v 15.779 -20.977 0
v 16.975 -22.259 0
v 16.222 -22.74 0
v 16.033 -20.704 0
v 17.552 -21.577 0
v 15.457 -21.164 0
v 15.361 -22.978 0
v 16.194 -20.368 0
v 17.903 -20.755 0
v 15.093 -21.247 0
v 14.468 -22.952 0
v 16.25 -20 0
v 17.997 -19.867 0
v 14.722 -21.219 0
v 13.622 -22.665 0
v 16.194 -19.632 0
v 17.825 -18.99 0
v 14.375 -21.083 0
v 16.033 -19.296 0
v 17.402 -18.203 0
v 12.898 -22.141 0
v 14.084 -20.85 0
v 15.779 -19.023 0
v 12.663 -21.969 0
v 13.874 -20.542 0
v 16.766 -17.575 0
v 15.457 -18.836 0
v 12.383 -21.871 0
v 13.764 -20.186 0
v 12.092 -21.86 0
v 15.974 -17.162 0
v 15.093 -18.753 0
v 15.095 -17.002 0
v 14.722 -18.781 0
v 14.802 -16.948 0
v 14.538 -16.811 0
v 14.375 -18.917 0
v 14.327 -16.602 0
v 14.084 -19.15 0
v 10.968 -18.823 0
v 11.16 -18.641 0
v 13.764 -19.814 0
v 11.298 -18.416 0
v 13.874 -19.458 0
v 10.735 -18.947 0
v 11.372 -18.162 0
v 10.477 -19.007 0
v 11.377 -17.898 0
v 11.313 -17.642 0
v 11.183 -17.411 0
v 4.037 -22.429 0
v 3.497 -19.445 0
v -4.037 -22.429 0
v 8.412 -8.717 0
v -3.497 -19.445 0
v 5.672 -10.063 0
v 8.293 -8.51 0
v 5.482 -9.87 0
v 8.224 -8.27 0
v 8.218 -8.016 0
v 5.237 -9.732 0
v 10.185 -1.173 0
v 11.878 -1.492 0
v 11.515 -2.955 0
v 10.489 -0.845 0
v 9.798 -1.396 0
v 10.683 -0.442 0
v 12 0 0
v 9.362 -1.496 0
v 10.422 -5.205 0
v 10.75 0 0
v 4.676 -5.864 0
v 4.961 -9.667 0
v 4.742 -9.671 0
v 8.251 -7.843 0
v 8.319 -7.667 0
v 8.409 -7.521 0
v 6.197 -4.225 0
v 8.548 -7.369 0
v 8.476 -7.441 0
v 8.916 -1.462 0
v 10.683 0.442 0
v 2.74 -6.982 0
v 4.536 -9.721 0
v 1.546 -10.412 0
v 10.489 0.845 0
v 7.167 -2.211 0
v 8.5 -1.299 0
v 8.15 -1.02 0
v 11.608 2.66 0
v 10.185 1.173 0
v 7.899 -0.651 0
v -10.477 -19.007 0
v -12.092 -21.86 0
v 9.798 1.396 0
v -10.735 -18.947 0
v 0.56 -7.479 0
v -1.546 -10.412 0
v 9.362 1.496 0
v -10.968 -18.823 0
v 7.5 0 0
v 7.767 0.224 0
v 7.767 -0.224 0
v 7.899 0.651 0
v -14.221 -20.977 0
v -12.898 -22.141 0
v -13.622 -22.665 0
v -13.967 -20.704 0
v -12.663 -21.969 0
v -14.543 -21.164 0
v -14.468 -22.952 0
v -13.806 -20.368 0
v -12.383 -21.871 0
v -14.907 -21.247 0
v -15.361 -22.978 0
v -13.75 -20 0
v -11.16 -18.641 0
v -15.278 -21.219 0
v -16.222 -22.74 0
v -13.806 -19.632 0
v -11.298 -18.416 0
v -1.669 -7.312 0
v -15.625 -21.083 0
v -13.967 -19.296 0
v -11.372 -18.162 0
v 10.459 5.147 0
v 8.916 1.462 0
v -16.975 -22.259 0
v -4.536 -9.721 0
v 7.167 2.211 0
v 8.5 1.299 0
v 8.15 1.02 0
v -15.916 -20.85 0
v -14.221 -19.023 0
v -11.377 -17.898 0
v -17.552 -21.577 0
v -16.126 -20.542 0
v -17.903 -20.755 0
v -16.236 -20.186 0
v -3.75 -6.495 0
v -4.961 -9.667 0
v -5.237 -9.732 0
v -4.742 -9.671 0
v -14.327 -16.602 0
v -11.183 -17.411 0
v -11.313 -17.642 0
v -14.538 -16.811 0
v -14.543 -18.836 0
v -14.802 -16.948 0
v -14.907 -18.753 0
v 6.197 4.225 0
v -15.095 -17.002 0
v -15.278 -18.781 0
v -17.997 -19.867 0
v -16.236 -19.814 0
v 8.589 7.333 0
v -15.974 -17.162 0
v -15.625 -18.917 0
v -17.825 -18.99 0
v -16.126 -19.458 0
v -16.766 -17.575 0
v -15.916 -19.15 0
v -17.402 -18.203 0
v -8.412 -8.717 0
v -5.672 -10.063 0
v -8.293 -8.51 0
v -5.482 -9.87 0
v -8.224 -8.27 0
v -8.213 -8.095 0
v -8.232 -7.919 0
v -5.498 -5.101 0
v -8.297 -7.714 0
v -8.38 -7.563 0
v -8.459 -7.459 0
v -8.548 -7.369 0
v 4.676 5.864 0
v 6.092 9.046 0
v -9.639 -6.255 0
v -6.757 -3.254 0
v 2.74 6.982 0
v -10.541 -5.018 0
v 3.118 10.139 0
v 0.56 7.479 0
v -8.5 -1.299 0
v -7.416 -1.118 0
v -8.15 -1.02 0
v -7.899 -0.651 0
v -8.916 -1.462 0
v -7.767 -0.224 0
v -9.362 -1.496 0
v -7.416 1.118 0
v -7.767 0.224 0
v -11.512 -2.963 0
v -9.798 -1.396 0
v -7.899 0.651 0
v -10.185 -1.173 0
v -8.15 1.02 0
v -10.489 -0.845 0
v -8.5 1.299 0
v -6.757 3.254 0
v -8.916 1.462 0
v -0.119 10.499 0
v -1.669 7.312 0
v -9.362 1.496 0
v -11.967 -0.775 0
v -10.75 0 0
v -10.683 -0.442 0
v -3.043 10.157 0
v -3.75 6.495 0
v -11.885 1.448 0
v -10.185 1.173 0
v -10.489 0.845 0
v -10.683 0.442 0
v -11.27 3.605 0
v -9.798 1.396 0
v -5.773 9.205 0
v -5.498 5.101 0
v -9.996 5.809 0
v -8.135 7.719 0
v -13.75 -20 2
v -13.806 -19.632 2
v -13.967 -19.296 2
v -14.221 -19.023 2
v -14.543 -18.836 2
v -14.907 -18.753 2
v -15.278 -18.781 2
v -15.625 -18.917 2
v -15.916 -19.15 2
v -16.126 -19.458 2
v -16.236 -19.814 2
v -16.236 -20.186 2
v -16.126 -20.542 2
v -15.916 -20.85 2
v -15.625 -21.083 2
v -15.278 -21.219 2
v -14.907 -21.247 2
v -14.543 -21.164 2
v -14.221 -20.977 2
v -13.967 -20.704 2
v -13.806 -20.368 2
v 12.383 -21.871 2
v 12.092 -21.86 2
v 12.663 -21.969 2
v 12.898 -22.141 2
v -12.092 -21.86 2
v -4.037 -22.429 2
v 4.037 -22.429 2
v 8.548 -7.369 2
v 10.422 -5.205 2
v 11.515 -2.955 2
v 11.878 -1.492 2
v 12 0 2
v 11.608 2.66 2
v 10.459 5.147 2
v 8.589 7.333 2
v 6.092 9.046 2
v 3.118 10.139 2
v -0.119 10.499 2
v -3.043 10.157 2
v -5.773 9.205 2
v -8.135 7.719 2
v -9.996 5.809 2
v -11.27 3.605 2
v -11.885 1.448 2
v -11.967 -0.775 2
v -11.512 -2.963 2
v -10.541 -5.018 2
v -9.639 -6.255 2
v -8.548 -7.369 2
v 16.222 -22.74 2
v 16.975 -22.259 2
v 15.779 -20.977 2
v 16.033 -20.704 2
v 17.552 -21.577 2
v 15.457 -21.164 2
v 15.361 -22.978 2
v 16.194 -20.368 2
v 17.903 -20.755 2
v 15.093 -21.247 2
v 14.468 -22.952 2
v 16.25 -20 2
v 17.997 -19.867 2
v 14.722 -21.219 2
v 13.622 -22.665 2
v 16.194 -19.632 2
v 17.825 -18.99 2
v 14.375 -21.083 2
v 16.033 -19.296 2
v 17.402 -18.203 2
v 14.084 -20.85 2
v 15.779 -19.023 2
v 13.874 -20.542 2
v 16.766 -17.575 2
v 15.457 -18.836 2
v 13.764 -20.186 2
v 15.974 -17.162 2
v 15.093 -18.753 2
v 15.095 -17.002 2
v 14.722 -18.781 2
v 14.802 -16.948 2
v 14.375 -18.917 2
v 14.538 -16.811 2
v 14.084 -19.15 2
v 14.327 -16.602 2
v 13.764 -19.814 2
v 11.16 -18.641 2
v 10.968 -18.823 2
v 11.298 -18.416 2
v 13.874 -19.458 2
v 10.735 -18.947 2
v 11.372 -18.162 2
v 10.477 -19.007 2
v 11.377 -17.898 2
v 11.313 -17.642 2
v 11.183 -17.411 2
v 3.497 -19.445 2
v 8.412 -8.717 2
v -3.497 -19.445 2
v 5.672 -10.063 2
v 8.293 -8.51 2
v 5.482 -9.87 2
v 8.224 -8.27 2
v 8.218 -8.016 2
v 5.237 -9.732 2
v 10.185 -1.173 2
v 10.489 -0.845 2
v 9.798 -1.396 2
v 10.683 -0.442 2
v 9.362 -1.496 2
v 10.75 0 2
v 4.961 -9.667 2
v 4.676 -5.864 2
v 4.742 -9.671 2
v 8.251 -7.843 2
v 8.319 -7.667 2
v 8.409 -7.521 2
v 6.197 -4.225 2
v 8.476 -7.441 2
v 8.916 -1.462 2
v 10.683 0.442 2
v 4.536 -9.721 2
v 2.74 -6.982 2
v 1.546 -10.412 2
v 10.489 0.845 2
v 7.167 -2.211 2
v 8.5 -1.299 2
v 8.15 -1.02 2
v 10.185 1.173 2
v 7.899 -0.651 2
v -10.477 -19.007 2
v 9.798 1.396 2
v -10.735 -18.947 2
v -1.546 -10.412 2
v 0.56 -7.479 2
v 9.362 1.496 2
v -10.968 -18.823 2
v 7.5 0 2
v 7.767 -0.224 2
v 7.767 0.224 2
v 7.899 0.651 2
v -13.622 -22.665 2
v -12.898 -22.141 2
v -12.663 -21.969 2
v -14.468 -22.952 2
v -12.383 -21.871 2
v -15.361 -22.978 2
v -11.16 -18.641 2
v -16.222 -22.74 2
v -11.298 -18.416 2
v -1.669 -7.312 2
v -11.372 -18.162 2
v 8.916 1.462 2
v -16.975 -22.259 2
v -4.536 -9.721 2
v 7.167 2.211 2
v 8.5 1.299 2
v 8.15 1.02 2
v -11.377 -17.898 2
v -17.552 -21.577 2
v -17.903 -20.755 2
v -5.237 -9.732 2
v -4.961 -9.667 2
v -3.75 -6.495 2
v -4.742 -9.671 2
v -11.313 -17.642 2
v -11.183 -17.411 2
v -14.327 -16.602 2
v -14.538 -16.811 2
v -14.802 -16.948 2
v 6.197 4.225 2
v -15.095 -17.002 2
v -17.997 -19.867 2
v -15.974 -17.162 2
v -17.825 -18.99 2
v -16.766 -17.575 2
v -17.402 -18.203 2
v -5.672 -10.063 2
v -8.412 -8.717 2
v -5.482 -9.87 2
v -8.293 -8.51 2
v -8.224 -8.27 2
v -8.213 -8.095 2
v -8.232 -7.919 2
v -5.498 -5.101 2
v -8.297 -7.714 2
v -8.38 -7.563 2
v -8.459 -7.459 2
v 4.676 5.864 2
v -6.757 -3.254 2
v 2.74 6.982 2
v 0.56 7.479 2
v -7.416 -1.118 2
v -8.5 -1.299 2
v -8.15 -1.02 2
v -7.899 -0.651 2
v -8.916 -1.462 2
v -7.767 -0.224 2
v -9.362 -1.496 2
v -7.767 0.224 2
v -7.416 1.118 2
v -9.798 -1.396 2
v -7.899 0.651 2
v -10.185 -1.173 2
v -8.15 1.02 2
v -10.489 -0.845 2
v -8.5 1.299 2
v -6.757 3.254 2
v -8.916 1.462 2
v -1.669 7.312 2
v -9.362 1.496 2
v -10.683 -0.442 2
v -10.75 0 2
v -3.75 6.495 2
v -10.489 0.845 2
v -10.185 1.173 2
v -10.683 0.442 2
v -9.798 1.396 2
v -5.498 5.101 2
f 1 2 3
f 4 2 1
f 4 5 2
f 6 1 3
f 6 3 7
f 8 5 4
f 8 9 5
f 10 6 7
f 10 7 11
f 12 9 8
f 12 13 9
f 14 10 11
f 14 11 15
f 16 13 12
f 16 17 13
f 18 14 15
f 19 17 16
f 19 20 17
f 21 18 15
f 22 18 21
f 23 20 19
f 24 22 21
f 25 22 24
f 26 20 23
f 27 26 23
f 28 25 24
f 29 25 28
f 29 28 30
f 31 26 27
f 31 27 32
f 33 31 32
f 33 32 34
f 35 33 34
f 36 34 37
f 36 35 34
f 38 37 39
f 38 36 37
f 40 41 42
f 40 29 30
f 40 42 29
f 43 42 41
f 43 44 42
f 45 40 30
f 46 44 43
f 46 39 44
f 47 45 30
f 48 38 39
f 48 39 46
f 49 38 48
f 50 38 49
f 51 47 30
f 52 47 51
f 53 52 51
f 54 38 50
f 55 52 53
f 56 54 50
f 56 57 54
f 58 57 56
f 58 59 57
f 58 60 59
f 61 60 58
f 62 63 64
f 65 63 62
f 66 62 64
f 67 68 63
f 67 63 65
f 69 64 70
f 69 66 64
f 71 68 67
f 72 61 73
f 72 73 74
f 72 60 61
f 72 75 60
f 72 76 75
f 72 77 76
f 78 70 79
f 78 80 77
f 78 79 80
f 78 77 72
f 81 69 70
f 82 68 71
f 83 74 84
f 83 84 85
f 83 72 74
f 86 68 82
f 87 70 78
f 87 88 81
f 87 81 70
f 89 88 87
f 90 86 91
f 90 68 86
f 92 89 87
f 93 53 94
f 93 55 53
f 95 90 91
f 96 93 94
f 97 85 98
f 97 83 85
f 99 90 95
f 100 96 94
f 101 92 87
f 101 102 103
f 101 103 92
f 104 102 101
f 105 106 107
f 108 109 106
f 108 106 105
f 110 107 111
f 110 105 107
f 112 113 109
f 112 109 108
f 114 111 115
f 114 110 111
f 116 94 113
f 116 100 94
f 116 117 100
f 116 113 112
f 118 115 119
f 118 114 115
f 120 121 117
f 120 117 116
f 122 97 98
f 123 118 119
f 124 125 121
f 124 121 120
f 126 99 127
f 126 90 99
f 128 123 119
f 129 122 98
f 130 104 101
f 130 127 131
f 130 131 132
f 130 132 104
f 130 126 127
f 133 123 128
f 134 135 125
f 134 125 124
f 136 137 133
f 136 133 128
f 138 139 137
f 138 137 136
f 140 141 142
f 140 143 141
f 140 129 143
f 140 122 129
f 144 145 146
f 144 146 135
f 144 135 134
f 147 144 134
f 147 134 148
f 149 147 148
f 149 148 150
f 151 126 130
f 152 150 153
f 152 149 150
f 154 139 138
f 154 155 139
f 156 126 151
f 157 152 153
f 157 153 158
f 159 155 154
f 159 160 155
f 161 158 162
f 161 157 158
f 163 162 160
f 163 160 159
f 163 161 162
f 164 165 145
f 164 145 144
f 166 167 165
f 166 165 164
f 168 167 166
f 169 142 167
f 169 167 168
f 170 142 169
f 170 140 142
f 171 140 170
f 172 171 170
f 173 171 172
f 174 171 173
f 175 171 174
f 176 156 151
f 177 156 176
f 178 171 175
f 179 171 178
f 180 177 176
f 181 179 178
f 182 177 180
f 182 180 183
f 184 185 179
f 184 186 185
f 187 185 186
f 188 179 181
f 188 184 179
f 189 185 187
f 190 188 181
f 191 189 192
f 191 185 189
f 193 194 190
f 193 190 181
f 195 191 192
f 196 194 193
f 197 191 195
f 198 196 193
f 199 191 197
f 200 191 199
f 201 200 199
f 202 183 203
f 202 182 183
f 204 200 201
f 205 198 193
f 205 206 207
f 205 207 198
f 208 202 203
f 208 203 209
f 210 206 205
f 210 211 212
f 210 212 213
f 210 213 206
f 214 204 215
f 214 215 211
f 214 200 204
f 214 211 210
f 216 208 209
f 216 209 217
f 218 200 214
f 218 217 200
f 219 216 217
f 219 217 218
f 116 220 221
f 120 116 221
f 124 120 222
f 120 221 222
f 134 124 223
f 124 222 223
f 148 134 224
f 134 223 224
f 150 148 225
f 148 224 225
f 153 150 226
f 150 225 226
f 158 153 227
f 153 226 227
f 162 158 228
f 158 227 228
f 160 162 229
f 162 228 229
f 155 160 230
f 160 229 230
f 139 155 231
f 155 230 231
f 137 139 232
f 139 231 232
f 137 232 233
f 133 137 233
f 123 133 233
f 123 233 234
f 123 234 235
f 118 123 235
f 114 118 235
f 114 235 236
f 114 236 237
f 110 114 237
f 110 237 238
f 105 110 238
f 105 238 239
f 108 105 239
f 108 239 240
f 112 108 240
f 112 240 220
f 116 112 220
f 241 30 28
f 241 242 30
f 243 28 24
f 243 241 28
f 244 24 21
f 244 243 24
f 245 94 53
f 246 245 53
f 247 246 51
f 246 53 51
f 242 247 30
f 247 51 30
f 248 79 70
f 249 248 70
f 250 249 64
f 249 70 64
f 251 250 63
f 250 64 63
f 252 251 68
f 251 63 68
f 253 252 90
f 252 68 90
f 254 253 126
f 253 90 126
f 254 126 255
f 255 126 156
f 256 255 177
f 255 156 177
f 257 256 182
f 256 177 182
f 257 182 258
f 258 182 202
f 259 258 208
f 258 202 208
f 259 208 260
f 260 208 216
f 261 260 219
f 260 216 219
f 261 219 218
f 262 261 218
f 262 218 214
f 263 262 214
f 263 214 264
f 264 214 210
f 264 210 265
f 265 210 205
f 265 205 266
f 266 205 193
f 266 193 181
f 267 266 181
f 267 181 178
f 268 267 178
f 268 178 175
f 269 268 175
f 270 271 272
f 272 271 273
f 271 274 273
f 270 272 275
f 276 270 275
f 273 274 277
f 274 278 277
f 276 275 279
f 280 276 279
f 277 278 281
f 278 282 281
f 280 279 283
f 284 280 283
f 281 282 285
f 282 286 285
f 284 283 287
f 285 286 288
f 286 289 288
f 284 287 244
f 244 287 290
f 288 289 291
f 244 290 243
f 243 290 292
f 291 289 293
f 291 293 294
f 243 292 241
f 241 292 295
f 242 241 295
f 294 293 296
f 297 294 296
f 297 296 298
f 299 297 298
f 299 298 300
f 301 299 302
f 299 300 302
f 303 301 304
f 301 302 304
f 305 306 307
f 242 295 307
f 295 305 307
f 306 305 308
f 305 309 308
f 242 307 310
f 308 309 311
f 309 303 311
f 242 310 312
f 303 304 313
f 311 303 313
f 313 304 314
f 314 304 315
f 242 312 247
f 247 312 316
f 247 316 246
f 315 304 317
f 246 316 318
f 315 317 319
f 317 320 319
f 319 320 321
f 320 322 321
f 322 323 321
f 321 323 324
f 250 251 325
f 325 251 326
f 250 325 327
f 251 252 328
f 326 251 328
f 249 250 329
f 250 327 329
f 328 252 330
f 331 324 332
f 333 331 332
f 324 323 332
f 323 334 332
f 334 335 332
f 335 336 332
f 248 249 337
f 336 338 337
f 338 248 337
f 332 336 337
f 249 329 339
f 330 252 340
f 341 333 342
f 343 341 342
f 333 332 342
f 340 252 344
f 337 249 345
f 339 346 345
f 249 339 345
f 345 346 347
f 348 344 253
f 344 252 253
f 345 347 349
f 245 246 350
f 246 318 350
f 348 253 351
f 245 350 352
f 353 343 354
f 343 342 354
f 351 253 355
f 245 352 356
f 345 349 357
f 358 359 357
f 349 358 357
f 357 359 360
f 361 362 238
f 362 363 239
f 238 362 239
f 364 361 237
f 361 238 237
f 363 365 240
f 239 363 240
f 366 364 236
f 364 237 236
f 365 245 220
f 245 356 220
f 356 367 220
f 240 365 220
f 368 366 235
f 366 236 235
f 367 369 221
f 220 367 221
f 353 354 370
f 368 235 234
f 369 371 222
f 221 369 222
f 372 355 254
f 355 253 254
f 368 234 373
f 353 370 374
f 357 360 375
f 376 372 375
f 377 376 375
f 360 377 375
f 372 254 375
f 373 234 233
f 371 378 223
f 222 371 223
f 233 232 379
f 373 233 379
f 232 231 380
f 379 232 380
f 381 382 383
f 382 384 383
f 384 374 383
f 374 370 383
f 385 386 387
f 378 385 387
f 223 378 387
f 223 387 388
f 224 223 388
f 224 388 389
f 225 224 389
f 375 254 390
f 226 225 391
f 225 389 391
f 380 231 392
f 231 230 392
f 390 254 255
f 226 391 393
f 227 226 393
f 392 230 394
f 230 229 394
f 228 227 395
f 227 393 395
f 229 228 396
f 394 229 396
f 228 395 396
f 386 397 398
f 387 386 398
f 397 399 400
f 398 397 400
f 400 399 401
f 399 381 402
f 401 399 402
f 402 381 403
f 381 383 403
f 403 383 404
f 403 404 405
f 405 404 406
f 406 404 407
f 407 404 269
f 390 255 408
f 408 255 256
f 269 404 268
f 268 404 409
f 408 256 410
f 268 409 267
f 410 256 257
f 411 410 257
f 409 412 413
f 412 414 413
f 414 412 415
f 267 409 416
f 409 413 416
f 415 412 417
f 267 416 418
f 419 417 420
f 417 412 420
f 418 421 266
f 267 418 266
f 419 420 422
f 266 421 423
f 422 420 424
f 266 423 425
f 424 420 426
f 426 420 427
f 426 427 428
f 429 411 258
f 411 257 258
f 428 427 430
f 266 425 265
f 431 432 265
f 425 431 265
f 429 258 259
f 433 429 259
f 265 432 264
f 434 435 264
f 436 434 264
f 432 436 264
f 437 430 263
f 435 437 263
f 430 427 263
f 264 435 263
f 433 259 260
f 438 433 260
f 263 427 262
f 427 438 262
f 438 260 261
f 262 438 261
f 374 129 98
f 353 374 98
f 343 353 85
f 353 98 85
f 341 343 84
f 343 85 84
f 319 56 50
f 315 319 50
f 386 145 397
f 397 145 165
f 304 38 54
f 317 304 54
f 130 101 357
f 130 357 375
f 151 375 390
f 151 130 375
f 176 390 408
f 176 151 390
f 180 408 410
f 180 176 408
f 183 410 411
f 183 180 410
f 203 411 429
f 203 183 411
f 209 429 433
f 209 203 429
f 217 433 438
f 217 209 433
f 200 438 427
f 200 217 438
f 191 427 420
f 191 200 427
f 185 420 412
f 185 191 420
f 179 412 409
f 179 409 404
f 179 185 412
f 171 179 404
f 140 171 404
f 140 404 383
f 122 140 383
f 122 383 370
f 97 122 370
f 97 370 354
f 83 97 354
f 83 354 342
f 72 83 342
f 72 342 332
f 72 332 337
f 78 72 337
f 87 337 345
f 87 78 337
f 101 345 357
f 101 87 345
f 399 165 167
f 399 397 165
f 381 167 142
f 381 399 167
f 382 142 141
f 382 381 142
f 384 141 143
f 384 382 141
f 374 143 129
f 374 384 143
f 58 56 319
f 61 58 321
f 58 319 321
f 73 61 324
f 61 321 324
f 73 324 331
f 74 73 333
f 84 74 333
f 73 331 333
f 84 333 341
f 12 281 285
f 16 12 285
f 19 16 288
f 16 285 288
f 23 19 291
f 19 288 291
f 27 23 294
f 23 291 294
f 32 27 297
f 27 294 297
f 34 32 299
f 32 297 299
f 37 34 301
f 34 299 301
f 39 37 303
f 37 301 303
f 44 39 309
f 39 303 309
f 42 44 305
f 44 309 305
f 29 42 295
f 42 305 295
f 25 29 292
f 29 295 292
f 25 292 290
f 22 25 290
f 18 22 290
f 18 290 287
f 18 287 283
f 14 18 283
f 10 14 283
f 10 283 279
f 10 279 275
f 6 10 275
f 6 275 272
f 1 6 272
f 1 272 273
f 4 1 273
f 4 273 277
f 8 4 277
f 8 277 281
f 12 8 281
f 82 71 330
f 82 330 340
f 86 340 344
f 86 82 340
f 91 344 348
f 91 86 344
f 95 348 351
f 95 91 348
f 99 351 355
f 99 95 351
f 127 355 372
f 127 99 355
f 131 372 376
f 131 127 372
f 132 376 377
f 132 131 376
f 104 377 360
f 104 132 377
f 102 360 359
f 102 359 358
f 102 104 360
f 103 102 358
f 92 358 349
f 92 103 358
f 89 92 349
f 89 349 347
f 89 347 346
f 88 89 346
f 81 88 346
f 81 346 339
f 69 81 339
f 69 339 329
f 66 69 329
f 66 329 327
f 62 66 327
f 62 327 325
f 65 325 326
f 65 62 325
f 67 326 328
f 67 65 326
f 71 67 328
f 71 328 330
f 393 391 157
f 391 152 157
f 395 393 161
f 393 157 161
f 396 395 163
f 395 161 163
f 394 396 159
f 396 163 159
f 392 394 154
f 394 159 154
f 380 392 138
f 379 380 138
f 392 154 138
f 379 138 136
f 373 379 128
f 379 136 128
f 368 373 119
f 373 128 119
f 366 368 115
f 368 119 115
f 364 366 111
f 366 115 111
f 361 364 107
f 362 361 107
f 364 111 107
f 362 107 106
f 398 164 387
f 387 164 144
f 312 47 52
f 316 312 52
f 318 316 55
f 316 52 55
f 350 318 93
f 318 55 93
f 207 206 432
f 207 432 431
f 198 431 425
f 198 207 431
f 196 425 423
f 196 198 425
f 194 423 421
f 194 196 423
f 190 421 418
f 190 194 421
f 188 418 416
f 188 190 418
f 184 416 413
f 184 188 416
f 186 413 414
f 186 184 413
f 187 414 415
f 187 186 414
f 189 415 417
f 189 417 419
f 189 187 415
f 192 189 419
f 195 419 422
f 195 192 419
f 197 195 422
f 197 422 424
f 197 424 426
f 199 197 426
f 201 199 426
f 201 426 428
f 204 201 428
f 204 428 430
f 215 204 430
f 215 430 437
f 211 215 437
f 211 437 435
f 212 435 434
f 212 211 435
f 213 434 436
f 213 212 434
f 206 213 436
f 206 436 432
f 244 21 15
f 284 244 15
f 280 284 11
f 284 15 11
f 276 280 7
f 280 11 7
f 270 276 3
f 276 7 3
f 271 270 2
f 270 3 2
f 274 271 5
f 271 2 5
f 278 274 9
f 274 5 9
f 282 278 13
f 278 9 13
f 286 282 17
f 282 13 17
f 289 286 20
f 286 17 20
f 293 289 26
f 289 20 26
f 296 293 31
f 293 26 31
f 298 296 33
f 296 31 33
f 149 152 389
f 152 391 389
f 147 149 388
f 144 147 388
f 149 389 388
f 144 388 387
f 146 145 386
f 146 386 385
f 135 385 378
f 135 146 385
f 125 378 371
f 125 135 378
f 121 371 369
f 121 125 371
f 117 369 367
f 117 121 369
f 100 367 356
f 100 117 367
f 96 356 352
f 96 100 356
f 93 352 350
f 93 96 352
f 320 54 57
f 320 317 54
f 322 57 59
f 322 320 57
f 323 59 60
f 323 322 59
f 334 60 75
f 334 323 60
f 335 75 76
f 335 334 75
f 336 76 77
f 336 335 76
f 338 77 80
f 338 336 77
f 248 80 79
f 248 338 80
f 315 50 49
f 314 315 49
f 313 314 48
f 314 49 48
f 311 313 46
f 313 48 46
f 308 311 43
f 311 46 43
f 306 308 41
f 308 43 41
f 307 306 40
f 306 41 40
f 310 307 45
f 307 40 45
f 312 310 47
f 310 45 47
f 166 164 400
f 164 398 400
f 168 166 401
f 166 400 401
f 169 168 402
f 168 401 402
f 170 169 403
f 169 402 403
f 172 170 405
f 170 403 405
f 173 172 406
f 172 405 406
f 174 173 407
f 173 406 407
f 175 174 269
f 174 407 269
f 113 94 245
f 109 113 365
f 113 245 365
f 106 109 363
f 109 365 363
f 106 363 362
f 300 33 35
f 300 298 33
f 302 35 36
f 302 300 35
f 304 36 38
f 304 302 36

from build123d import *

# Parameters (mm, degrees)
SKETCH_1_R         = 3
SKETCH_1_R_2       = 1
EXTRUDE_1_DEPTH    = 2
EXTRUDE_1_2_DEPTH  = 2
SKETCH_1_RX        = 12
SKETCH_1_RY        = 10.5
SKETCH_1_R_3       = 7.5
SKETCH_1_R_4       = 1.5
EXTRUDE_1_3_DEPTH  = 2
EXTRUDE_START      = -2
EXTRUDE_3_DEPTH    = 2
FILLET_3_R         = 1
EXTRUDE_4_DEPTH    = 2
HOLE_WIZARD_M3_1_D = 2.5


with BuildPart() as part:
    # ｽｹｯﾁ1 → ﾎﾞｽ - 押し出し1 (new body)
    with BuildSketch(Plane.XY):
        with Locations((-15, -20)):
            Circle(SKETCH_1_R)
        with Locations((-15, -20)):
            Circle(SKETCH_1_R_2, mode=Mode.SUBTRACT)
    extrude(amount=EXTRUDE_1_DEPTH)



with BuildPart() as body_2:
    # ｽｹｯﾁ1 → Extrude 1 2 (new body)
    with BuildSketch(Plane.XY):
        with Locations(Location((15, -20, 0), (0, 0, 180))):
            Circle(SKETCH_1_R)
        with Locations(Location((15, -20, 0), (0, 0, 180))):
            Circle(SKETCH_1_R_2, mode=Mode.SUBTRACT)
    extrude(amount=EXTRUDE_1_2_DEPTH)


with BuildPart() as body_3:
    # ｽｹｯﾁ1 → Extrude 1 3 (new body)
    with BuildSketch(Plane.XY):
        with Locations((0, 0)):
            Ellipse(SKETCH_1_RX, SKETCH_1_RY)
        Circle(SKETCH_1_R_3, mode=Mode.SUBTRACT)
        with Locations((9.25, 0)):
            Circle(SKETCH_1_R_4, mode=Mode.SUBTRACT)
        with Locations(Location((-9.25, 0, 0), (0, 0, 180))):
            Circle(SKETCH_1_R_4, mode=Mode.SUBTRACT)
    extrude(amount=EXTRUDE_1_3_DEPTH)


with BuildPart() as part_1:
    add(part.part)

    add(body_2.part)  # ﾎﾞｽ - 押し出し3 merges body 2

    add(body_3.part)  # ﾎﾞｽ - 押し出し3 merges body 3
    # ｽｹｯﾁ7 → ﾎﾞｽ - 押し出し3 (add)
    with BuildSketch(Plane.XY.offset(2).offset(EXTRUDE_START)):
        with BuildLine():
            Line((-7.838039348, -7.95071913), (-14.641154273, -17.021539031))
            ThreePointArc((-14.641154273, -17.021539031), (-13.2, -17.6), (-12.241154273, -18.821539031))
            Line((-12.241154273, -18.821539031), (-5.216878938, -9.455838584))
            add(Edge.make_bspline(
                [(-7.838039348, -7.95071913), (-6.640783086, -8.854377448), (-5.216878938, -9.455838584)],
                knots=[4.000625721, 4.000625721, 4.000625721, 4.262639533, 4.262639533, 4.262639533], degree=2, weights=[1, 0.991430862, 1]))
        make_face()
        with BuildLine():
            Line((5.216878938, -9.455838584), (12.241154273, -18.821539031))
            ThreePointArc((12.241154273, -18.821539031), (13.2, -17.6), (14.641154273, -17.021539031))
            Line((14.641154273, -17.021539031), (7.838039348, -7.95071913))
            add(Edge.make_bspline(
                [(5.216878938, -9.455838584), (6.640783086, -8.854377448), (7.838039348, -7.95071913)],
                knots=[2.020545775, 2.020545775, 2.020545775, 2.282559586, 2.282559586, 2.282559586], degree=2, weights=[1, 0.991430862, 1]))
        make_face()
        with BuildLine():
            ThreePointArc((-12.603200099, -21.804258915), (0, -22.5), (12.603200099, -21.804258915))
            ThreePointArc((12.603200099, -21.804258915), (12.022167048, -20.364020483), (12.239155559, -18.826229166))
            ThreePointArc((12.239155559, -18.826229166), (0, -19.5), (-12.239155559, -18.826229166))
            ThreePointArc((-12.239155559, -18.826229166), (-12.022167048, -20.364020483), (-12.603200099, -21.804258915))
        make_face()
    extrude(amount=EXTRUDE_3_DEPTH)

    # ﾌｨﾚｯﾄ3
    fillet_3_edges = [part_1.edges().sort_by_distance(p)[0] for p in [
        (-7.838039348, -7.95071913, 1),
        (7.838039348, -7.95071913, 1),
        (-14.641154273, -17.021539031, 1),
        (14.641154273, -17.021539031, 1),
        (12.603200099, -21.804258915, 1),
        (-12.603200099, -21.804258915, 1),
        (-5.216878938, -9.455838584, 1),
        (5.216878938, -9.455838584, 1),
    ]]
    fillet(fillet_3_edges, radius=FILLET_3_R)

    # ｽｹｯﾁ8 → ﾎﾞｽ - 押し出し4 (add)
    with BuildSketch(Plane.XY.offset(2).offset(EXTRUDE_START)):
        with BuildLine():
            Line((-12.241154273, -18.821539031), (-11.183307296, -17.411076395))
            ThreePointArc((-11.183307296, -17.411076395), (-11.297779405, -18.415725331), (-10.477273878, -19.006651747))
            ThreePointArc((-10.477273878, -19.006651747), (-11.358572959, -18.919938786), (-12.239155559, -18.826229166))
            ThreePointArc((-12.239155559, -18.826229166), (-12.24015392, -18.823883674), (-12.241154273, -18.821539031))
        make_face()
        with BuildLine():
            Line((12.241154273, -18.821539031), (11.183307296, -17.411076395))
            ThreePointArc((11.183307296, -17.411076395), (11.297779405, -18.415725331), (10.477273878, -19.006651747))
            ThreePointArc((10.477273878, -19.006651747), (11.358572959, -18.919938786), (12.239155559, -18.826229166))
            ThreePointArc((12.239155559, -18.826229166), (12.24015392, -18.823883674), (12.241154273, -18.821539031))
        make_face()
    extrude(amount=EXTRUDE_4_DEPTH)

    # M3 ねじ穴1 (through all)
    with Locations(Plane(origin=(0, 0, 0), x_dir=(-1, 0, 0), z_dir=(0, 0, -1))):
        with Locations((-15, -20), (15, -20)):
            Hole(HOLE_WIZARD_M3_1_D / 2)


solid = part_1.part
